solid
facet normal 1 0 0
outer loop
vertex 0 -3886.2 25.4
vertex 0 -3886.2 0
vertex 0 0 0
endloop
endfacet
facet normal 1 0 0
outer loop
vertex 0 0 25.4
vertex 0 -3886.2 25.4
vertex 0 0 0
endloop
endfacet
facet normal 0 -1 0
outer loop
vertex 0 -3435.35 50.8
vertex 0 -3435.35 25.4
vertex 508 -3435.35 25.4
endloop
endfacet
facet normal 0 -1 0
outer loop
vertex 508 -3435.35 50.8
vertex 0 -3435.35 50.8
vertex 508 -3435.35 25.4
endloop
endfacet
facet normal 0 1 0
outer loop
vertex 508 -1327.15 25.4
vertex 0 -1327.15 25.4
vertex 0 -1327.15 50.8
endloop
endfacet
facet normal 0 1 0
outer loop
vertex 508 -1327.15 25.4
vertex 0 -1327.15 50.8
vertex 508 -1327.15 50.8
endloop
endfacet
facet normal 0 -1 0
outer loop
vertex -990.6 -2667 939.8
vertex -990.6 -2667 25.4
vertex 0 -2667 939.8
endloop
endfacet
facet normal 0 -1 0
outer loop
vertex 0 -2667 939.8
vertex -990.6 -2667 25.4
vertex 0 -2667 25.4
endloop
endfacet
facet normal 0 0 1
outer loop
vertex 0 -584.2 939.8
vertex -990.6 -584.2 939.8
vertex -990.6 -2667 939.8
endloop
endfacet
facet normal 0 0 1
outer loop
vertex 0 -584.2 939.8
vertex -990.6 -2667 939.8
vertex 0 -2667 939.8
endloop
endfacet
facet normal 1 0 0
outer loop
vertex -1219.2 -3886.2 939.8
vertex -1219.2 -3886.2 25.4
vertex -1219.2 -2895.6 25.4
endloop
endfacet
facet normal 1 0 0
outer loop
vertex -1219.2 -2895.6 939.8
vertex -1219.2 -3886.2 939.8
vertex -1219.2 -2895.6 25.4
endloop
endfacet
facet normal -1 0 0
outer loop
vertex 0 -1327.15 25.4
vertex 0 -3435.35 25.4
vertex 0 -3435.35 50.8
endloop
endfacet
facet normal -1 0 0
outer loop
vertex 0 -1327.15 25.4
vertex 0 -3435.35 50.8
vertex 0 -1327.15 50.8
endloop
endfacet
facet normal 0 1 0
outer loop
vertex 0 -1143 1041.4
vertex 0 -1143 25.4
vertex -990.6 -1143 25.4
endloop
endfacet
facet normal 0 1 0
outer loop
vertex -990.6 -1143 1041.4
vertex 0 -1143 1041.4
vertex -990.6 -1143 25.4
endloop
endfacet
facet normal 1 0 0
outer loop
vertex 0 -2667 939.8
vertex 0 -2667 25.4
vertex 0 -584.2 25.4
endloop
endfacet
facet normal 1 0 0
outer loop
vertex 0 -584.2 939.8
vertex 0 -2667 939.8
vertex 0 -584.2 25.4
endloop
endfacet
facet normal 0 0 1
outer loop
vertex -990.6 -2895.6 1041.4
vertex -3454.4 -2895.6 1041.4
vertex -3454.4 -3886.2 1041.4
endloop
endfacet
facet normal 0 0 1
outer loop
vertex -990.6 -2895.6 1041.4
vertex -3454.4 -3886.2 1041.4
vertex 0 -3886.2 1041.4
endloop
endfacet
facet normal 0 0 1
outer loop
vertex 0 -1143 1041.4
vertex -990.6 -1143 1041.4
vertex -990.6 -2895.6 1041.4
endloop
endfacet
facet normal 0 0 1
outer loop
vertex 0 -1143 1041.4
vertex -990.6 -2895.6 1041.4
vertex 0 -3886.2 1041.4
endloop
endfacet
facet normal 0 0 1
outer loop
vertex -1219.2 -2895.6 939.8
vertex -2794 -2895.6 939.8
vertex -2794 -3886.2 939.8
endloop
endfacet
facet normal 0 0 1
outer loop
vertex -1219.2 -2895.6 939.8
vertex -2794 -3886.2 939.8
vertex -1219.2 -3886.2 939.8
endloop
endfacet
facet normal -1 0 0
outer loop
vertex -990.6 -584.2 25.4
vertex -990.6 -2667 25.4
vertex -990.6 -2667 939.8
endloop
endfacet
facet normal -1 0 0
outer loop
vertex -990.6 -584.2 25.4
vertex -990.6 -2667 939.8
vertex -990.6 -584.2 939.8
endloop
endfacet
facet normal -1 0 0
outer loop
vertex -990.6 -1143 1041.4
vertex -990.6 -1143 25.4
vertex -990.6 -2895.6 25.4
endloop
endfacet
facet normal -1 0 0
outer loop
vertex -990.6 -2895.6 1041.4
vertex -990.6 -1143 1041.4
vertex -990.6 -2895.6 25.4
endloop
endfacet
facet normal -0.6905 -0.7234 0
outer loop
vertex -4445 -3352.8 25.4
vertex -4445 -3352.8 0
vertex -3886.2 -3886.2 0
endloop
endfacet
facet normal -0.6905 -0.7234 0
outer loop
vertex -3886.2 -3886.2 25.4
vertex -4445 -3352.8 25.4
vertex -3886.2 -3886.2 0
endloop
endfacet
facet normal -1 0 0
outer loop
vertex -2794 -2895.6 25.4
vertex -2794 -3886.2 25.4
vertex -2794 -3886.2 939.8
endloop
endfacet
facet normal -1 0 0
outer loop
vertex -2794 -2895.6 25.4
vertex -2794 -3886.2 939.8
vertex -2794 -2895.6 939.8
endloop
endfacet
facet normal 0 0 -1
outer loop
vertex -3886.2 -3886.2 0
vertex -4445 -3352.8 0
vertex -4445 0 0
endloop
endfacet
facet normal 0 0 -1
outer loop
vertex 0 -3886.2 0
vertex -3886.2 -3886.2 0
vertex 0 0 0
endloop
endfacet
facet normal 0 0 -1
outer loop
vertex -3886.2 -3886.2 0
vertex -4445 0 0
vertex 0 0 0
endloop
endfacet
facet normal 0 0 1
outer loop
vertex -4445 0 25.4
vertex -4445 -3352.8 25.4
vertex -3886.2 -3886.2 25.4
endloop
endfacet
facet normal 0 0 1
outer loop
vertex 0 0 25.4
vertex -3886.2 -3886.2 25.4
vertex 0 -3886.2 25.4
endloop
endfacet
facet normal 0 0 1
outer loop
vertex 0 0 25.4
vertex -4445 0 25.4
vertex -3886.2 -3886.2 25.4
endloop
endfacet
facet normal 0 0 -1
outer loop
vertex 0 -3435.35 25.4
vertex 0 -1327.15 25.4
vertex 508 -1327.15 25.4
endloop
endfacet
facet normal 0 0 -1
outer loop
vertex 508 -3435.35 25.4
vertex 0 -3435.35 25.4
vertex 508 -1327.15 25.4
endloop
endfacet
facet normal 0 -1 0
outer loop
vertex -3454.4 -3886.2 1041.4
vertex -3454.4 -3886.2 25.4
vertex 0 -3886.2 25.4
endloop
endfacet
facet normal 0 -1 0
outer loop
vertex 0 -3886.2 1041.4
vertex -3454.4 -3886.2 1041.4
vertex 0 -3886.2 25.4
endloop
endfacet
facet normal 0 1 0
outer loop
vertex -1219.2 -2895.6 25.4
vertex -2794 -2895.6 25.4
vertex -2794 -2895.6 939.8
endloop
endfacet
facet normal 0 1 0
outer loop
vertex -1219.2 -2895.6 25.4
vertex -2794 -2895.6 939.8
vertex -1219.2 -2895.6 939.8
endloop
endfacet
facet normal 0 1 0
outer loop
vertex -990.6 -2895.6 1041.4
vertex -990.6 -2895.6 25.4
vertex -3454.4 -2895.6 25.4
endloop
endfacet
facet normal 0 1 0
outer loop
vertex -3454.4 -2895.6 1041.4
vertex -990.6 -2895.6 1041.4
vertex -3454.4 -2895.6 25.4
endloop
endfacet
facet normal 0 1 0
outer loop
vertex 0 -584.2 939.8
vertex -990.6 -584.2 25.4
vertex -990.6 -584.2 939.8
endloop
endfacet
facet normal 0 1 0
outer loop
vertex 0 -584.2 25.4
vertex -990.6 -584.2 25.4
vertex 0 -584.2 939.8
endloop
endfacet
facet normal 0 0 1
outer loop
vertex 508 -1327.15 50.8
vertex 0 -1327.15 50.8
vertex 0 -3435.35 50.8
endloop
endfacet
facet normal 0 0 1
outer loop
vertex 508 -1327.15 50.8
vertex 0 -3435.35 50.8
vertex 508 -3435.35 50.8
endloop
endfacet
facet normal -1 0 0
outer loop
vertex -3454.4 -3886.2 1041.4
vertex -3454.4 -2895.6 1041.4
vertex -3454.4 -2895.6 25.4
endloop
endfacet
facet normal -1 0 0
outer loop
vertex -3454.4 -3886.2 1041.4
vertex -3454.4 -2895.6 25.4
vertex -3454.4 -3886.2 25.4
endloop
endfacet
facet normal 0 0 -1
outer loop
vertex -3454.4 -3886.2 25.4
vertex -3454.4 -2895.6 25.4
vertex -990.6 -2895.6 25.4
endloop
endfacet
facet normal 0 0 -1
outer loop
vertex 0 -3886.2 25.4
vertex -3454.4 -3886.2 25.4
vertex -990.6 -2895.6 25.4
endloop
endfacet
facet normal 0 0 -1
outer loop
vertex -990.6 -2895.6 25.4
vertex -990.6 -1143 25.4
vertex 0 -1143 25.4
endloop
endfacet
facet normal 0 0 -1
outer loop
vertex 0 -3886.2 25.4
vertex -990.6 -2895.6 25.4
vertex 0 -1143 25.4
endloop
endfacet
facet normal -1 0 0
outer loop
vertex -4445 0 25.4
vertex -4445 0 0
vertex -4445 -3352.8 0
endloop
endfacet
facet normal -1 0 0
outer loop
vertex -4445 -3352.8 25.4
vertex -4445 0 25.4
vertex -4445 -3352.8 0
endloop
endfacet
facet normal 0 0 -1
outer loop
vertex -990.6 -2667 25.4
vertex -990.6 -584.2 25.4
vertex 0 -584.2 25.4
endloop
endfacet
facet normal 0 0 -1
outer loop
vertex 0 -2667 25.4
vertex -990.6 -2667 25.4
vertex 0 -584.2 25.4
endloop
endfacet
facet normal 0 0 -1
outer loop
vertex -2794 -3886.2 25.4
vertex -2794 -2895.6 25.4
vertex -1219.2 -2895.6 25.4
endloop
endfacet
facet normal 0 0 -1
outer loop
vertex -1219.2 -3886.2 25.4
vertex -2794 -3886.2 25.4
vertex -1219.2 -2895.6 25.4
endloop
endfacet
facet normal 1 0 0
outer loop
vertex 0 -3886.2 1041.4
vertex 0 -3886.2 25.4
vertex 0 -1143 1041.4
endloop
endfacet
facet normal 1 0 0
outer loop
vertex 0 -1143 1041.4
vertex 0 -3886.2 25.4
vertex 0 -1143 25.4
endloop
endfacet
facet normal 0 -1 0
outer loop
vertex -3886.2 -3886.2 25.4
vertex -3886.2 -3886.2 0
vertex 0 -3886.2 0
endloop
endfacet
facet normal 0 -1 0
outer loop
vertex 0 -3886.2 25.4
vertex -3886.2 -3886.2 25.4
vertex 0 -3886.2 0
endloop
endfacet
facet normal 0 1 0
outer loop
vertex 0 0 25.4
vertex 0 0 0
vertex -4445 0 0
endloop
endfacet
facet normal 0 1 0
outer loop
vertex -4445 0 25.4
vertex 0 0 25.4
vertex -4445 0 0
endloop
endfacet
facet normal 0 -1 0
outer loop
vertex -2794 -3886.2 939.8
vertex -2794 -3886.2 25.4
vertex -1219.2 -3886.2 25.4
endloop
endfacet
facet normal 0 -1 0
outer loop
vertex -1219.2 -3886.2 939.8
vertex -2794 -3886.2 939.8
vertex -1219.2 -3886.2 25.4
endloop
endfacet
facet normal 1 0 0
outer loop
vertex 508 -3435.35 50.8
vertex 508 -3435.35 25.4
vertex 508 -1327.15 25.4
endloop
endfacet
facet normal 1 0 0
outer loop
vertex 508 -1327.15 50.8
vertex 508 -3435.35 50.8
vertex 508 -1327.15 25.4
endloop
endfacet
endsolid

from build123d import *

# Parameters (mm, degrees)
F1_DEPTH = 25.4
F2_W     = 508
F2_H     = 2108.2
F3_DEPTH = 25.4
F4_W     = 1574.8
F4_H     = 990.6
F4_W_2   = 990.6
F4_H_2   = 2082.8
F5_DEPTH = 914.4
F7_DEPTH = 1016


with BuildPart() as f1:
    # F0 (on Top) → F1 (new body)
    with BuildSketch(Plane.XY):
        Polygon((0, -3886.2), (0, 0), (-4445, 0), (-4445, -3352.8), (-3886.2, -3886.2), align=None)
    extrude(amount=F1_DEPTH)


with BuildPart() as f3:
    # F2 (on face) → F3 (new body)
    with BuildSketch(Plane.XY.offset(25.4)):
        with Locations((254, -2381.25)):
            Rectangle(F2_W, F2_H)
    extrude(amount=F3_DEPTH)


with BuildPart() as f5:
    # F4 (on face) → F5 (new body)
    with BuildSketch(Plane.XY.offset(25.4)):
        with Locations((-2006.6, -3390.9)):
            Rectangle(F4_W, F4_H)
        with Locations((-495.3, -1625.6)):
            Rectangle(F4_W_2, F4_H_2)
    extrude(amount=F5_DEPTH)


with BuildPart() as f7:
    # F6 (on face) → F7 (new body)
    with BuildSketch(Plane.XY.offset(25.4)):
        Polygon((-3454.4, -2895.6), (-3454.4, -3886.2), (0, -3886.2), (0, -1143), (-990.6, -1143), (-990.6, -2895.6), align=None)
    extrude(amount=F7_DEPTH)


solid = Compound([f1.part, f3.part, f5.part, f7.part])
